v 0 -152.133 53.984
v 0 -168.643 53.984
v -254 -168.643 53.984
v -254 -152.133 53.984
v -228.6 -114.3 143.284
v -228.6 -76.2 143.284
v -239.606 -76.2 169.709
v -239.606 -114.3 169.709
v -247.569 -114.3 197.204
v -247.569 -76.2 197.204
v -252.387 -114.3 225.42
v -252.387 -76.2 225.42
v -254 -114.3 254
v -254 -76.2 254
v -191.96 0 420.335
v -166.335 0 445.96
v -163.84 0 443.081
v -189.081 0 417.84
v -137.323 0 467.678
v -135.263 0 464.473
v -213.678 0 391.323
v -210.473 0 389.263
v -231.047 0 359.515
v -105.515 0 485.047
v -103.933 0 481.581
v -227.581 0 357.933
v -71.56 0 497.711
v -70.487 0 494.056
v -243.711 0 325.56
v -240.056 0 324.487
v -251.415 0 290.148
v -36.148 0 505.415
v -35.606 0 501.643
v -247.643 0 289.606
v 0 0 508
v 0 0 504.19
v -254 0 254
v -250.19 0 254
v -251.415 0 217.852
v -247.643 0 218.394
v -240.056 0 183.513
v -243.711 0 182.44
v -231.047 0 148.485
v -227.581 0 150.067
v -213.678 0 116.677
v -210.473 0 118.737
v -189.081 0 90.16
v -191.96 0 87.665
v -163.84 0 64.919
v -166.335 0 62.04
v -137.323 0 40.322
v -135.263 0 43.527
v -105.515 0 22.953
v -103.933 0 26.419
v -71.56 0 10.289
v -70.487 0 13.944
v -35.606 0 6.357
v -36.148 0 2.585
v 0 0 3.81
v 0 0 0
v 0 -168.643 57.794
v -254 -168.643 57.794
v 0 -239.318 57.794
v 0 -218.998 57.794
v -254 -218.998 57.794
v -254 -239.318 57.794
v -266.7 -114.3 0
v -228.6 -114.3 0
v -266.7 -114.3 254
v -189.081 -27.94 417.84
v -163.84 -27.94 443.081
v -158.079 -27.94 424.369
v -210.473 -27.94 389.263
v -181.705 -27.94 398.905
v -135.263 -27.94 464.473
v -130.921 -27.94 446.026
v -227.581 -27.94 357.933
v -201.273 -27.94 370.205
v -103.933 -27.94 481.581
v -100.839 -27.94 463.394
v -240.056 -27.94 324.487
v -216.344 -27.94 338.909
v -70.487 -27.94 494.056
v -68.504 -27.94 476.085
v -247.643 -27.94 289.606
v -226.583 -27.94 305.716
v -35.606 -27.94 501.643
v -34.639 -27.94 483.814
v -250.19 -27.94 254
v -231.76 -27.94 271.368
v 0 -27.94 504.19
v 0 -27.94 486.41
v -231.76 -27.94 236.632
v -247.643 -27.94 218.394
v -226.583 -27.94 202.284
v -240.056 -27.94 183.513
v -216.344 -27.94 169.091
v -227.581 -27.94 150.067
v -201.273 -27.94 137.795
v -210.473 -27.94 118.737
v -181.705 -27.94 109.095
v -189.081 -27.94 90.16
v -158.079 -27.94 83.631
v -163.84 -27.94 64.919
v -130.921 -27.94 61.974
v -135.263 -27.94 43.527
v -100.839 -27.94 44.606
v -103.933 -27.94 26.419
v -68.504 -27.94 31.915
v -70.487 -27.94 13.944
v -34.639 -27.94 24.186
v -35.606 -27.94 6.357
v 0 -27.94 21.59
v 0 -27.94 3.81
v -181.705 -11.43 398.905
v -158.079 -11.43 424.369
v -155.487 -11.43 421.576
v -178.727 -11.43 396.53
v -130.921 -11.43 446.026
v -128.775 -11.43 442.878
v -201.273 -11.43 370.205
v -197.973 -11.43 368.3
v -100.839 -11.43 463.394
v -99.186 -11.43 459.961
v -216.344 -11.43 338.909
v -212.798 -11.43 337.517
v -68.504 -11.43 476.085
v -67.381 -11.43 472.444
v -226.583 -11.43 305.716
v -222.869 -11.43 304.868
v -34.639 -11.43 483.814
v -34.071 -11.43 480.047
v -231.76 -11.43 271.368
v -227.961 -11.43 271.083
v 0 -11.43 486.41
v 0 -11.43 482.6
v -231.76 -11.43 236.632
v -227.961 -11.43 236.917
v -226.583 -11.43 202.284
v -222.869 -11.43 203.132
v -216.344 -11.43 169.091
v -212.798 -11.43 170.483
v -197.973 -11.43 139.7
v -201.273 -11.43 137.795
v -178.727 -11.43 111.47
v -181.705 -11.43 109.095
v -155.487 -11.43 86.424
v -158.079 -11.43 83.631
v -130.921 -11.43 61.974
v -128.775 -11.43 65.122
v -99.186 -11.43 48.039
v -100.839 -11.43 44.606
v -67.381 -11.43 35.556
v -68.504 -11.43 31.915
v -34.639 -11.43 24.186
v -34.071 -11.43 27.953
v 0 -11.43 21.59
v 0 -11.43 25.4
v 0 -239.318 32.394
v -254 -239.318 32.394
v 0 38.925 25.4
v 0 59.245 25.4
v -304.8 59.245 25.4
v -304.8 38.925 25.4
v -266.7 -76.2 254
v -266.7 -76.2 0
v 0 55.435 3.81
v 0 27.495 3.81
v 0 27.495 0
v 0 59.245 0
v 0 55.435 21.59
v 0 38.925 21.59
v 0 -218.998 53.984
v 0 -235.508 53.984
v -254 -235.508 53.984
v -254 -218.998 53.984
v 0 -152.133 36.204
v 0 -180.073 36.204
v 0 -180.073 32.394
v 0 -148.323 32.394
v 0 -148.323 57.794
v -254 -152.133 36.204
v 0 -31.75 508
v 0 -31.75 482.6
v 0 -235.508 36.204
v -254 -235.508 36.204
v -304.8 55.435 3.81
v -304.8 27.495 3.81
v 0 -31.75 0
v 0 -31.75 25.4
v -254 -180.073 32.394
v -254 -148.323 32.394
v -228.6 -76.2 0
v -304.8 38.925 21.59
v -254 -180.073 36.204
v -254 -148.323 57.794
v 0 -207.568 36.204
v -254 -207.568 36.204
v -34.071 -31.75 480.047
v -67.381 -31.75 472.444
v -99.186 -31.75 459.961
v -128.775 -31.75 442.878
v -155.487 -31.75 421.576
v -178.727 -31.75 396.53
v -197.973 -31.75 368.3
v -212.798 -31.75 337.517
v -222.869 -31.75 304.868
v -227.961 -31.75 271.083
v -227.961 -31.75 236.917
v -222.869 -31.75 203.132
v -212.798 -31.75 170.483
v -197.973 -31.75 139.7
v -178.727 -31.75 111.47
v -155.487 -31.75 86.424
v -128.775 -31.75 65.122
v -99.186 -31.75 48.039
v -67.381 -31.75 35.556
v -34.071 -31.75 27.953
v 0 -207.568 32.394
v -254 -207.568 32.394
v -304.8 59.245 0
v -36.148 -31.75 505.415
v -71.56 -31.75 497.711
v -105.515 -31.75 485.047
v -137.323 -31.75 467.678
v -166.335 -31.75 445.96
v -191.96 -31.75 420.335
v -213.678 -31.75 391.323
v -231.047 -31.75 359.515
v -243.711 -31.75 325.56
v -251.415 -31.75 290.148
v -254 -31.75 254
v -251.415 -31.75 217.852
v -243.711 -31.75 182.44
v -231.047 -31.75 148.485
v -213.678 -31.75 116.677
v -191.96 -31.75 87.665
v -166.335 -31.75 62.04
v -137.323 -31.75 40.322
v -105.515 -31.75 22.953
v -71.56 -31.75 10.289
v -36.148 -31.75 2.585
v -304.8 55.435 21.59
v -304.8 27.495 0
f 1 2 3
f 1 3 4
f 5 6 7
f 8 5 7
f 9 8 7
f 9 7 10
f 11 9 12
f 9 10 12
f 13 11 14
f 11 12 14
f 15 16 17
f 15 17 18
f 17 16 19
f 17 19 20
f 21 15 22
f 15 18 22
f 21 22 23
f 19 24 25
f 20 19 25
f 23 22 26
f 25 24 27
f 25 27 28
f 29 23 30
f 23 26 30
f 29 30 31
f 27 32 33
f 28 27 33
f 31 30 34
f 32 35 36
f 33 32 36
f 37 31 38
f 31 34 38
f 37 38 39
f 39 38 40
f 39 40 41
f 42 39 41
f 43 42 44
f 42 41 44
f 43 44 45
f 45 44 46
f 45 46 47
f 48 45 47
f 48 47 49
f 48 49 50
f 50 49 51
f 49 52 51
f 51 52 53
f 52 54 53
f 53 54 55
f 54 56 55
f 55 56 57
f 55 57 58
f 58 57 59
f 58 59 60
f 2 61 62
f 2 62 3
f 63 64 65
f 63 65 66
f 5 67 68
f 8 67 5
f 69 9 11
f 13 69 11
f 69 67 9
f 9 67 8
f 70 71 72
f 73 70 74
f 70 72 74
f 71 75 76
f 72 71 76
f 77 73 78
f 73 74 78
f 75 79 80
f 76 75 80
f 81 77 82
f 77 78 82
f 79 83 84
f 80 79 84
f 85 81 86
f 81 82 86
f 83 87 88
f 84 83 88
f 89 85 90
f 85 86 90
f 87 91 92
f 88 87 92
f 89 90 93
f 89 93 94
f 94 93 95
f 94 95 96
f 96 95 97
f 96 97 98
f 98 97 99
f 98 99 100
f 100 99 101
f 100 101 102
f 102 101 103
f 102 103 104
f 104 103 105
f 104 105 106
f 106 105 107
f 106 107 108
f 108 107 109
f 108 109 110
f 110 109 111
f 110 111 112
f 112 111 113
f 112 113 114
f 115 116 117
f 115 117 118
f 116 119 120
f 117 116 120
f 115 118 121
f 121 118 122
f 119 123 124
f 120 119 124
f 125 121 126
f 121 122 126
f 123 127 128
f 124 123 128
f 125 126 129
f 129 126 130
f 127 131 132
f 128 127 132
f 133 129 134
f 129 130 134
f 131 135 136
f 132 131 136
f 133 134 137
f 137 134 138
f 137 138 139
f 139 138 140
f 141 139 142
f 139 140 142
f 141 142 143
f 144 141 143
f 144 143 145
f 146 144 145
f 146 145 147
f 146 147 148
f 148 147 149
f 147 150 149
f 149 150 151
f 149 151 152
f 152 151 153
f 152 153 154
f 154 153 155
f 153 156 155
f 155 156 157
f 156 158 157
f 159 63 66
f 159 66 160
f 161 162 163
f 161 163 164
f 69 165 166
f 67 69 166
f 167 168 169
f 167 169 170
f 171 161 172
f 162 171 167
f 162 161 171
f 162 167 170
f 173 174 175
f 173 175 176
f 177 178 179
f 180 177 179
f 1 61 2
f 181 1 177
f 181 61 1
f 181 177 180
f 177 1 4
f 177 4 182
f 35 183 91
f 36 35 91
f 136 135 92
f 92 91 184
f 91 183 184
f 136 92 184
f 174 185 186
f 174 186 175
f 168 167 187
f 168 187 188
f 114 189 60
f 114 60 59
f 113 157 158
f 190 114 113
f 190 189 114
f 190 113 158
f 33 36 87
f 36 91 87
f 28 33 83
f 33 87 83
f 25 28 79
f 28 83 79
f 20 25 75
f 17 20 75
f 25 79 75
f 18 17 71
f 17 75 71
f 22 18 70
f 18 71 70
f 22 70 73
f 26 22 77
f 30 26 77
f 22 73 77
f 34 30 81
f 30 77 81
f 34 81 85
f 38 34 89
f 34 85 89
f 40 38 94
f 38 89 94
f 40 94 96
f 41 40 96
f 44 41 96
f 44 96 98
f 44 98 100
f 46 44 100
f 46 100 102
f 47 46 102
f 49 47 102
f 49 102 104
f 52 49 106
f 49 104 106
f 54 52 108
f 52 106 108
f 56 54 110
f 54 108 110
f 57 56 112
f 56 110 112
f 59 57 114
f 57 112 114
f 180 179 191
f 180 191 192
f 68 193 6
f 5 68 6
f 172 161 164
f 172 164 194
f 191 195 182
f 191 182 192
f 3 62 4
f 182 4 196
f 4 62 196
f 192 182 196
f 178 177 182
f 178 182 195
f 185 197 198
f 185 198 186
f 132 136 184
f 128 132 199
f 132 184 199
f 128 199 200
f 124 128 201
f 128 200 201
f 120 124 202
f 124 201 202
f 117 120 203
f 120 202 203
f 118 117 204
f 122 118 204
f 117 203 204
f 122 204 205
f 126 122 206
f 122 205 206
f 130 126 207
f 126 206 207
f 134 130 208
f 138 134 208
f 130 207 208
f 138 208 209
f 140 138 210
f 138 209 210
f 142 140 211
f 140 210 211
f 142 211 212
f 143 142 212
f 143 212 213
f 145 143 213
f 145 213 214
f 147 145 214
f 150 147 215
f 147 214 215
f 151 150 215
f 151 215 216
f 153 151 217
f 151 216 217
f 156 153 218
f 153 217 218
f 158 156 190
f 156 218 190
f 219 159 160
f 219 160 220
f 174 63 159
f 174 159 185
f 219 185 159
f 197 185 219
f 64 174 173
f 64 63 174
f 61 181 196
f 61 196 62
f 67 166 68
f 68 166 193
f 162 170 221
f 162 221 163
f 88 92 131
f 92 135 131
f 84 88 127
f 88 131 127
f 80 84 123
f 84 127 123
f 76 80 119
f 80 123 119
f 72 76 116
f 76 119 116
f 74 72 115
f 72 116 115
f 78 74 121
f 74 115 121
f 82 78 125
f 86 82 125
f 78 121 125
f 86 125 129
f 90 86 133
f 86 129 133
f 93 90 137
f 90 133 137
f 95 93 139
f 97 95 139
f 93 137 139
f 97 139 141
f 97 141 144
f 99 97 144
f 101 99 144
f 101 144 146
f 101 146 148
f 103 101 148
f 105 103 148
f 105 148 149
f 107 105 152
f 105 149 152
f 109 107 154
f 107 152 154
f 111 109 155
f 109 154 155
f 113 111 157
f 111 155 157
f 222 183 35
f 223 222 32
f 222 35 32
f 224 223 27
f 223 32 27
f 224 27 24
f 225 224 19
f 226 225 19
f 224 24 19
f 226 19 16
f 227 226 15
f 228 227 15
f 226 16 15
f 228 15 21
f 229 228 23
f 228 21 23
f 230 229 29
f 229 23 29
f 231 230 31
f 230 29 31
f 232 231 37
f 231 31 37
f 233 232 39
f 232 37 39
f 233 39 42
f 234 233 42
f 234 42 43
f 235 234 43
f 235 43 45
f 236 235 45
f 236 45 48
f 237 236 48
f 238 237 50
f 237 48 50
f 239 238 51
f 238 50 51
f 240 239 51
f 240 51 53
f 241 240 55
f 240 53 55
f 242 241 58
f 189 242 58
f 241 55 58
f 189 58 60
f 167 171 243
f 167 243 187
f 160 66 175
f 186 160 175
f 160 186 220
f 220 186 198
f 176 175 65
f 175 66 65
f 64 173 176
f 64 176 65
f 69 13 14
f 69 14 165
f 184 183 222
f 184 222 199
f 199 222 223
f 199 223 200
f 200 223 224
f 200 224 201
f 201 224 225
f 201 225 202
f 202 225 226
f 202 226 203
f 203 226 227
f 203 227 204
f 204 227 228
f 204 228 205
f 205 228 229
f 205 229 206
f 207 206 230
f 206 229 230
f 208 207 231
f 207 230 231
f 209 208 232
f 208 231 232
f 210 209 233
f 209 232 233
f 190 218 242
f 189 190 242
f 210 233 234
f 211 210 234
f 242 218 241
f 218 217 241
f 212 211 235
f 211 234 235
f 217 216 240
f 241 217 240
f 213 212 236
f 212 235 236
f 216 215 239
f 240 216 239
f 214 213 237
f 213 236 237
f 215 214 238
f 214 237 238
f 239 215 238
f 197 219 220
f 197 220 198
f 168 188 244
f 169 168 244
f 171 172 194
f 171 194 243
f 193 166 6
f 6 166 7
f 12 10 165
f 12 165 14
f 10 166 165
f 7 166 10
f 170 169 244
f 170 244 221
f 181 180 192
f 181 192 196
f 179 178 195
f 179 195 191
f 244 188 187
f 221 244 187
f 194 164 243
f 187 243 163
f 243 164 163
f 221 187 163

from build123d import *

# Parameters (mm, degrees)
F4_DEPTH = 254
F7_DEPTH = 38.1
F8_DEPTH = 304.8


with BuildPart() as f2:
    # F2: sweep along a path in F1
    with BuildLine(Plane.XZ) as f2_path:
        ThreePointArc((0, 508), (-254, 254), (0, 0))
    # F0 (on Right) → F2 (sweep)
    with BuildSketch(Plane.YZ):
        Polygon((-27.94, 3.81), (-27.94, 21.59), (-11.43, 21.59), (-11.43, 25.4), (-31.75, 25.4), (-31.75, 0), (0, 0), (0, 3.81), align=None)
    sweep(path=f2_path.line)


with BuildPart() as f4:
    # F3 (on Right) → F4 (new body)
    with BuildSketch(Plane.YZ):
        Polygon((-235.50825, 36.203678), (-235.50825, 53.983678), (-218.99825, 53.983678), (-218.99825, 57.793678), (-239.31825, 57.793678), (-239.31825, 32.393678), (-207.56825, 32.393678), (-207.56825, 36.203678), align=None)
        Polygon((-168.642944, 53.983678), (-152.132944, 53.983678), (-152.132944, 36.203678), (-180.072944, 36.203678), (-180.072944, 32.393678), (-148.322944, 32.393678), (-148.322944, 57.793678), (-152.132944, 57.793678), (-168.642944, 57.793678), align=None)
    extrude(amount=-F4_DEPTH)


with BuildPart() as f7:
    # F6 (on offset) → F7 (new body)
    with BuildSketch(Plane.XZ.offset(76.2)):
        with BuildLine():
            Line((-266.7, 254), (-266.7, 0))
            Line((-266.7, 0), (-228.6, 0))
            Line((-228.6, 0), (-228.6, 143.283967))
            ThreePointArc((-228.6, 143.283967), (-247.568576, 197.203873), (-254, 254))
            Line((-254, 254), (-266.7, 254))
        make_face()
    extrude(amount=F7_DEPTH)


with BuildPart() as f8:
    # F0 (on Right) → F8 (new body)
    with BuildSketch(Plane.YZ):
        Polygon((38.925306, 21.59), (55.435306, 21.59), (55.435306, 3.81), (27.495306, 3.81), (27.495306, 0), (59.245306, 0), (59.245306, 25.4), (55.435306, 25.4), (38.925306, 25.4), align=None)
    extrude(amount=-F8_DEPTH)


solid = Compound([f2.part, f4.part, f7.part, f8.part])
